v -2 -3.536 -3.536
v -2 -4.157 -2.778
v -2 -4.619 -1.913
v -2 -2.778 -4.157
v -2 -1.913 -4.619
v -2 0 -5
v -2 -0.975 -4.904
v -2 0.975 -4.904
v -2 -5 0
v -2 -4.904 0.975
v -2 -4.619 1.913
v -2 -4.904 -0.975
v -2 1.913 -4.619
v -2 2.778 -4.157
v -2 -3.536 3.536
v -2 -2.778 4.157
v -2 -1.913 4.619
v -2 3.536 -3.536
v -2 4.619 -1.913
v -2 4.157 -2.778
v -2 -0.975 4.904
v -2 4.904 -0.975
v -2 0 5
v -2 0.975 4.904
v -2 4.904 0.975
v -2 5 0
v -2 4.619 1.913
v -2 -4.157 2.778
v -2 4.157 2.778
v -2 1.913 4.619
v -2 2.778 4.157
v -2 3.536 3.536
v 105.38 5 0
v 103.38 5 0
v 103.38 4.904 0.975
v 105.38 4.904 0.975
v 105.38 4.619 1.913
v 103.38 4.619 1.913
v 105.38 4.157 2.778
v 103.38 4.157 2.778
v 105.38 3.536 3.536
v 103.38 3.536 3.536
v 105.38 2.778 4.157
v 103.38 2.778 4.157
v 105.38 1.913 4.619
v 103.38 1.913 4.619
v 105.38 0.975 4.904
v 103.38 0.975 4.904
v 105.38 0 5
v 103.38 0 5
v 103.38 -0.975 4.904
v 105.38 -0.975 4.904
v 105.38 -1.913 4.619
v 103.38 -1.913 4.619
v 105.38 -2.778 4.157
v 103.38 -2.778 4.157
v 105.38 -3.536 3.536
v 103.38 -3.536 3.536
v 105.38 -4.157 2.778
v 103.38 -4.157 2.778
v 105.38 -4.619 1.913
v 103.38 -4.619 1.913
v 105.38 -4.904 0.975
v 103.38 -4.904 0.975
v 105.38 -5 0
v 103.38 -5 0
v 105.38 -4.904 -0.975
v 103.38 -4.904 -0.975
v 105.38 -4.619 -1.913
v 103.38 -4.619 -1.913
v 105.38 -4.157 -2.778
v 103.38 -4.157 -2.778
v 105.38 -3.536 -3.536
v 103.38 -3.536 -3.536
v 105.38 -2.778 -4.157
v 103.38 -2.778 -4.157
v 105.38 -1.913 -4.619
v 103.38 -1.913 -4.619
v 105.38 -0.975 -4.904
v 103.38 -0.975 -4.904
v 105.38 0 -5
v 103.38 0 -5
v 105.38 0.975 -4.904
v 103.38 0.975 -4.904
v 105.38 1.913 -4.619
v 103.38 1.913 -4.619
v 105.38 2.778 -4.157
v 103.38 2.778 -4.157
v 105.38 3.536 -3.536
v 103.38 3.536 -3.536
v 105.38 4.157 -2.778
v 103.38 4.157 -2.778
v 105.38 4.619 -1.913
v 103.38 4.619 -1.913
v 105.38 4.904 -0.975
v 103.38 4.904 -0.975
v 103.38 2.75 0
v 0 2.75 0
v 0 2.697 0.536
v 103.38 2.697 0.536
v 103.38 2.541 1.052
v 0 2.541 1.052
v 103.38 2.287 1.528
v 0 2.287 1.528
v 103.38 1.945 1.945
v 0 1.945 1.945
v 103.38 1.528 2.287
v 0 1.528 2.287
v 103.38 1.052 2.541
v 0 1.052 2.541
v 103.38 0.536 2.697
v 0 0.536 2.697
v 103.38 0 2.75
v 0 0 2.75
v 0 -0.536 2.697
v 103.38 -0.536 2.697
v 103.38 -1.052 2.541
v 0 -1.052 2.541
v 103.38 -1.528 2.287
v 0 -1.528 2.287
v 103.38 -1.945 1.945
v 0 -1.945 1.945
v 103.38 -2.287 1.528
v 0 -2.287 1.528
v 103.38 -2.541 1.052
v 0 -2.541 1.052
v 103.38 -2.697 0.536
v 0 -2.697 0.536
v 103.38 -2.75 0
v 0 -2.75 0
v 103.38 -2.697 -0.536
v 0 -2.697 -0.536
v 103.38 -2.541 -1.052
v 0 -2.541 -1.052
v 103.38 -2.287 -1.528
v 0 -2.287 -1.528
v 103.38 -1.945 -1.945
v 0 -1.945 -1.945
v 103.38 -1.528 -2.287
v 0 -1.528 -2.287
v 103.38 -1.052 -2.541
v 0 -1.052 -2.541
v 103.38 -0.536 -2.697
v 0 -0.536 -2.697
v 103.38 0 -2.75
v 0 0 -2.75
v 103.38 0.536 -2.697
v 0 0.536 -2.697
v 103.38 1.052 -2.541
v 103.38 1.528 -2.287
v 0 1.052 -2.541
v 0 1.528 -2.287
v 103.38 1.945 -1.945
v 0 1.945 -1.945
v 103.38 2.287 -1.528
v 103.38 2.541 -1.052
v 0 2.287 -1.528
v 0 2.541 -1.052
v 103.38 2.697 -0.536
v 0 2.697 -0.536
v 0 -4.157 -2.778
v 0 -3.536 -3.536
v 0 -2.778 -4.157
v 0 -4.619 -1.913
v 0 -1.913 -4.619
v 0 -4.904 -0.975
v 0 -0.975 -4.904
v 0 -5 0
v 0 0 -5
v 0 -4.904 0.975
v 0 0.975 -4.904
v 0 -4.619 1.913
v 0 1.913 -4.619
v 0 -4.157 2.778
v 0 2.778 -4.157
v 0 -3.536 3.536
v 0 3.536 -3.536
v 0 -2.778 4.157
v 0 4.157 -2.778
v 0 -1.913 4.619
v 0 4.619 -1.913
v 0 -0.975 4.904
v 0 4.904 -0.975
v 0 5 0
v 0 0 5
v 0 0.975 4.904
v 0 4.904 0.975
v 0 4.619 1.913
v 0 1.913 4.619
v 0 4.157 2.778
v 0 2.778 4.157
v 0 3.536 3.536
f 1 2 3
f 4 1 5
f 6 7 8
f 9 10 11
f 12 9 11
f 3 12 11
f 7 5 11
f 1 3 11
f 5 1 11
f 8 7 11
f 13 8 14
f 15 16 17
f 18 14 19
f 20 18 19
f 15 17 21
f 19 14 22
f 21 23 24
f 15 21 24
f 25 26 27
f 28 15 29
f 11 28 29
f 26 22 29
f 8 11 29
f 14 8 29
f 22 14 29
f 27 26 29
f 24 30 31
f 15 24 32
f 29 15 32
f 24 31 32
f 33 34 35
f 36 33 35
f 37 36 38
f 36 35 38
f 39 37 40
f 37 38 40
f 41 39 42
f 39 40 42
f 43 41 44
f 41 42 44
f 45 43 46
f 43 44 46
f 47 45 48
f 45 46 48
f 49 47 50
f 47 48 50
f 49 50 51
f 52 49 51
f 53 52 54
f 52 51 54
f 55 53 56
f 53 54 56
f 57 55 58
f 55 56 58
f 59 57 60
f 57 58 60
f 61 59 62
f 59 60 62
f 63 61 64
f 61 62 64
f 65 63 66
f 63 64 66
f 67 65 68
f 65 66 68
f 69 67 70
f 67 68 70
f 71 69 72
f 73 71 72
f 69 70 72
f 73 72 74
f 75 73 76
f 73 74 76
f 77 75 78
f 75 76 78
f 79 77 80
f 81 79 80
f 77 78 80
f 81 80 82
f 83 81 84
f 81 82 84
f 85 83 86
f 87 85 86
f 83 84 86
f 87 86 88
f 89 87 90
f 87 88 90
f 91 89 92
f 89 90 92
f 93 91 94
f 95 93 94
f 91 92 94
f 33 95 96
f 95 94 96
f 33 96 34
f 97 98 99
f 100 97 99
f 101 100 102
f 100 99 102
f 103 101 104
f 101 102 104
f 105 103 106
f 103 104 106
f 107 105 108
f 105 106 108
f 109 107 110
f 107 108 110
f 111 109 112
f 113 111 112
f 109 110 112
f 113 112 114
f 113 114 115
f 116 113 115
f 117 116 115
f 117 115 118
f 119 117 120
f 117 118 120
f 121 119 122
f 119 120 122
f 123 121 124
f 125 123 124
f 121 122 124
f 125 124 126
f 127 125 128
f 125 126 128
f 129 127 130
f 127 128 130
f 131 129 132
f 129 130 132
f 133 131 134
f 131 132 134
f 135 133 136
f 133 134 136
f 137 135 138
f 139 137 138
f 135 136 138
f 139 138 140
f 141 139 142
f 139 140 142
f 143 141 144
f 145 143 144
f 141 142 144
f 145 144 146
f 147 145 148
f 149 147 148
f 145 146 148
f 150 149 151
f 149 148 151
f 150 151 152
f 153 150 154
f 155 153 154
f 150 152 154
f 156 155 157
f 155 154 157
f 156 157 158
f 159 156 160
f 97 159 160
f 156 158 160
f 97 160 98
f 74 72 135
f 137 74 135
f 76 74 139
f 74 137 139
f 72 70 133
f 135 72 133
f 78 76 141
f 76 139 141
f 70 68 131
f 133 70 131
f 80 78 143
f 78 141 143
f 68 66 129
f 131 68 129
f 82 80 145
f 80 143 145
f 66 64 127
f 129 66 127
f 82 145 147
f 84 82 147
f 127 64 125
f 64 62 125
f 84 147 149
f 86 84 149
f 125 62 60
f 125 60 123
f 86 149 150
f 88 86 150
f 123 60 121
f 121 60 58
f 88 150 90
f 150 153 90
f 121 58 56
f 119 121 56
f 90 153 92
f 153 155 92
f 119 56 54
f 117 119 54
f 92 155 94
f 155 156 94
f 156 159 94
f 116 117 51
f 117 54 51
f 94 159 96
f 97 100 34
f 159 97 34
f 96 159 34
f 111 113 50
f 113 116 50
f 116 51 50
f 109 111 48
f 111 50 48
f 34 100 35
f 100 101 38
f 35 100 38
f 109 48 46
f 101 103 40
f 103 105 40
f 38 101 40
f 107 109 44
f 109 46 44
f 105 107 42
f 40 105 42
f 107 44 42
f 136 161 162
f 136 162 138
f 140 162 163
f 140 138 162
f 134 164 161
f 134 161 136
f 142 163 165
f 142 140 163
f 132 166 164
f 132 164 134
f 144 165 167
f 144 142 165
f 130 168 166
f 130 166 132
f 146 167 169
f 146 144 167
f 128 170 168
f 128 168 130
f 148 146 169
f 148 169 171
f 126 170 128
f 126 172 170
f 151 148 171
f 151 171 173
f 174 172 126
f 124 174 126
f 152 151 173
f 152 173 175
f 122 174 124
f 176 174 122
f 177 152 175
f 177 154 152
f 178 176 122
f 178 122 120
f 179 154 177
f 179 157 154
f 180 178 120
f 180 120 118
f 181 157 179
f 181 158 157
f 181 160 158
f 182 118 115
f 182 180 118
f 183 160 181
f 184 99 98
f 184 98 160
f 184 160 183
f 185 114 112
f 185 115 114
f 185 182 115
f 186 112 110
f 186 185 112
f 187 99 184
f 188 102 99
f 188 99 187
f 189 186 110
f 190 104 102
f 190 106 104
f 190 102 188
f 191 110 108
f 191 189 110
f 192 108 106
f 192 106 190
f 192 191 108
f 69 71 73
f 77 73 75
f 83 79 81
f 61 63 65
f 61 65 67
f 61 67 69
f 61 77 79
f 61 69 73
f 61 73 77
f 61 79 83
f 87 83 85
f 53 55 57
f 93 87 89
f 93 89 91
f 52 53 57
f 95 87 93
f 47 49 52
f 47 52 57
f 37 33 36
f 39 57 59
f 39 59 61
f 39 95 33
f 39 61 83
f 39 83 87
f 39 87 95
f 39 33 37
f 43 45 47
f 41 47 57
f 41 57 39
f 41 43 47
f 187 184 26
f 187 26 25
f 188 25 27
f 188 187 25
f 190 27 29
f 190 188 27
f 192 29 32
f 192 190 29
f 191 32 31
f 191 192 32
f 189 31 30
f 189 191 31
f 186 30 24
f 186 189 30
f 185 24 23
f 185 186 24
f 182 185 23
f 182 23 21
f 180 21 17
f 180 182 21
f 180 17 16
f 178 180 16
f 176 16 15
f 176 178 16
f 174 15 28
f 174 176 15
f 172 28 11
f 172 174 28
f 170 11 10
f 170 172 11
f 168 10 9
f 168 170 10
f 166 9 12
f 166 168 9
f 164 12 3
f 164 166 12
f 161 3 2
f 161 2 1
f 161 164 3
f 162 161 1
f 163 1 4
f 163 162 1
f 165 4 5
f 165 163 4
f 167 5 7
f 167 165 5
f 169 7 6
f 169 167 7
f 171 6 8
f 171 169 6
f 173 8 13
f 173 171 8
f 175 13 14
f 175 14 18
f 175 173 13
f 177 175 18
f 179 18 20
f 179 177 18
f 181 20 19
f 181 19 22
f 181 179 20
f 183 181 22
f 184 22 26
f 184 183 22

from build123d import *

# Parameters (mm, degrees)
F0_R     = 2.75
F1_DEPTH = 103.38
F2_R     = 5
F3_DEPTH = 2
F5_R     = 5
F6_DEPTH = 2


with BuildPart() as f1:
    # F0 (on Right) → F1 (new body)
    with BuildSketch(Plane.YZ):
        Circle(F0_R)
    extrude(amount=F1_DEPTH)

    # F2 (on Right) → F3 (join)
    with BuildSketch(Plane.YZ):
        Circle(F2_R)
    extrude(amount=-F3_DEPTH)

    # F5 (on offset) → F6 (join)
    with BuildSketch(Plane.YZ.offset(103.38)):
        Circle(F5_R)
    extrude(amount=F6_DEPTH)


solid = f1.part
